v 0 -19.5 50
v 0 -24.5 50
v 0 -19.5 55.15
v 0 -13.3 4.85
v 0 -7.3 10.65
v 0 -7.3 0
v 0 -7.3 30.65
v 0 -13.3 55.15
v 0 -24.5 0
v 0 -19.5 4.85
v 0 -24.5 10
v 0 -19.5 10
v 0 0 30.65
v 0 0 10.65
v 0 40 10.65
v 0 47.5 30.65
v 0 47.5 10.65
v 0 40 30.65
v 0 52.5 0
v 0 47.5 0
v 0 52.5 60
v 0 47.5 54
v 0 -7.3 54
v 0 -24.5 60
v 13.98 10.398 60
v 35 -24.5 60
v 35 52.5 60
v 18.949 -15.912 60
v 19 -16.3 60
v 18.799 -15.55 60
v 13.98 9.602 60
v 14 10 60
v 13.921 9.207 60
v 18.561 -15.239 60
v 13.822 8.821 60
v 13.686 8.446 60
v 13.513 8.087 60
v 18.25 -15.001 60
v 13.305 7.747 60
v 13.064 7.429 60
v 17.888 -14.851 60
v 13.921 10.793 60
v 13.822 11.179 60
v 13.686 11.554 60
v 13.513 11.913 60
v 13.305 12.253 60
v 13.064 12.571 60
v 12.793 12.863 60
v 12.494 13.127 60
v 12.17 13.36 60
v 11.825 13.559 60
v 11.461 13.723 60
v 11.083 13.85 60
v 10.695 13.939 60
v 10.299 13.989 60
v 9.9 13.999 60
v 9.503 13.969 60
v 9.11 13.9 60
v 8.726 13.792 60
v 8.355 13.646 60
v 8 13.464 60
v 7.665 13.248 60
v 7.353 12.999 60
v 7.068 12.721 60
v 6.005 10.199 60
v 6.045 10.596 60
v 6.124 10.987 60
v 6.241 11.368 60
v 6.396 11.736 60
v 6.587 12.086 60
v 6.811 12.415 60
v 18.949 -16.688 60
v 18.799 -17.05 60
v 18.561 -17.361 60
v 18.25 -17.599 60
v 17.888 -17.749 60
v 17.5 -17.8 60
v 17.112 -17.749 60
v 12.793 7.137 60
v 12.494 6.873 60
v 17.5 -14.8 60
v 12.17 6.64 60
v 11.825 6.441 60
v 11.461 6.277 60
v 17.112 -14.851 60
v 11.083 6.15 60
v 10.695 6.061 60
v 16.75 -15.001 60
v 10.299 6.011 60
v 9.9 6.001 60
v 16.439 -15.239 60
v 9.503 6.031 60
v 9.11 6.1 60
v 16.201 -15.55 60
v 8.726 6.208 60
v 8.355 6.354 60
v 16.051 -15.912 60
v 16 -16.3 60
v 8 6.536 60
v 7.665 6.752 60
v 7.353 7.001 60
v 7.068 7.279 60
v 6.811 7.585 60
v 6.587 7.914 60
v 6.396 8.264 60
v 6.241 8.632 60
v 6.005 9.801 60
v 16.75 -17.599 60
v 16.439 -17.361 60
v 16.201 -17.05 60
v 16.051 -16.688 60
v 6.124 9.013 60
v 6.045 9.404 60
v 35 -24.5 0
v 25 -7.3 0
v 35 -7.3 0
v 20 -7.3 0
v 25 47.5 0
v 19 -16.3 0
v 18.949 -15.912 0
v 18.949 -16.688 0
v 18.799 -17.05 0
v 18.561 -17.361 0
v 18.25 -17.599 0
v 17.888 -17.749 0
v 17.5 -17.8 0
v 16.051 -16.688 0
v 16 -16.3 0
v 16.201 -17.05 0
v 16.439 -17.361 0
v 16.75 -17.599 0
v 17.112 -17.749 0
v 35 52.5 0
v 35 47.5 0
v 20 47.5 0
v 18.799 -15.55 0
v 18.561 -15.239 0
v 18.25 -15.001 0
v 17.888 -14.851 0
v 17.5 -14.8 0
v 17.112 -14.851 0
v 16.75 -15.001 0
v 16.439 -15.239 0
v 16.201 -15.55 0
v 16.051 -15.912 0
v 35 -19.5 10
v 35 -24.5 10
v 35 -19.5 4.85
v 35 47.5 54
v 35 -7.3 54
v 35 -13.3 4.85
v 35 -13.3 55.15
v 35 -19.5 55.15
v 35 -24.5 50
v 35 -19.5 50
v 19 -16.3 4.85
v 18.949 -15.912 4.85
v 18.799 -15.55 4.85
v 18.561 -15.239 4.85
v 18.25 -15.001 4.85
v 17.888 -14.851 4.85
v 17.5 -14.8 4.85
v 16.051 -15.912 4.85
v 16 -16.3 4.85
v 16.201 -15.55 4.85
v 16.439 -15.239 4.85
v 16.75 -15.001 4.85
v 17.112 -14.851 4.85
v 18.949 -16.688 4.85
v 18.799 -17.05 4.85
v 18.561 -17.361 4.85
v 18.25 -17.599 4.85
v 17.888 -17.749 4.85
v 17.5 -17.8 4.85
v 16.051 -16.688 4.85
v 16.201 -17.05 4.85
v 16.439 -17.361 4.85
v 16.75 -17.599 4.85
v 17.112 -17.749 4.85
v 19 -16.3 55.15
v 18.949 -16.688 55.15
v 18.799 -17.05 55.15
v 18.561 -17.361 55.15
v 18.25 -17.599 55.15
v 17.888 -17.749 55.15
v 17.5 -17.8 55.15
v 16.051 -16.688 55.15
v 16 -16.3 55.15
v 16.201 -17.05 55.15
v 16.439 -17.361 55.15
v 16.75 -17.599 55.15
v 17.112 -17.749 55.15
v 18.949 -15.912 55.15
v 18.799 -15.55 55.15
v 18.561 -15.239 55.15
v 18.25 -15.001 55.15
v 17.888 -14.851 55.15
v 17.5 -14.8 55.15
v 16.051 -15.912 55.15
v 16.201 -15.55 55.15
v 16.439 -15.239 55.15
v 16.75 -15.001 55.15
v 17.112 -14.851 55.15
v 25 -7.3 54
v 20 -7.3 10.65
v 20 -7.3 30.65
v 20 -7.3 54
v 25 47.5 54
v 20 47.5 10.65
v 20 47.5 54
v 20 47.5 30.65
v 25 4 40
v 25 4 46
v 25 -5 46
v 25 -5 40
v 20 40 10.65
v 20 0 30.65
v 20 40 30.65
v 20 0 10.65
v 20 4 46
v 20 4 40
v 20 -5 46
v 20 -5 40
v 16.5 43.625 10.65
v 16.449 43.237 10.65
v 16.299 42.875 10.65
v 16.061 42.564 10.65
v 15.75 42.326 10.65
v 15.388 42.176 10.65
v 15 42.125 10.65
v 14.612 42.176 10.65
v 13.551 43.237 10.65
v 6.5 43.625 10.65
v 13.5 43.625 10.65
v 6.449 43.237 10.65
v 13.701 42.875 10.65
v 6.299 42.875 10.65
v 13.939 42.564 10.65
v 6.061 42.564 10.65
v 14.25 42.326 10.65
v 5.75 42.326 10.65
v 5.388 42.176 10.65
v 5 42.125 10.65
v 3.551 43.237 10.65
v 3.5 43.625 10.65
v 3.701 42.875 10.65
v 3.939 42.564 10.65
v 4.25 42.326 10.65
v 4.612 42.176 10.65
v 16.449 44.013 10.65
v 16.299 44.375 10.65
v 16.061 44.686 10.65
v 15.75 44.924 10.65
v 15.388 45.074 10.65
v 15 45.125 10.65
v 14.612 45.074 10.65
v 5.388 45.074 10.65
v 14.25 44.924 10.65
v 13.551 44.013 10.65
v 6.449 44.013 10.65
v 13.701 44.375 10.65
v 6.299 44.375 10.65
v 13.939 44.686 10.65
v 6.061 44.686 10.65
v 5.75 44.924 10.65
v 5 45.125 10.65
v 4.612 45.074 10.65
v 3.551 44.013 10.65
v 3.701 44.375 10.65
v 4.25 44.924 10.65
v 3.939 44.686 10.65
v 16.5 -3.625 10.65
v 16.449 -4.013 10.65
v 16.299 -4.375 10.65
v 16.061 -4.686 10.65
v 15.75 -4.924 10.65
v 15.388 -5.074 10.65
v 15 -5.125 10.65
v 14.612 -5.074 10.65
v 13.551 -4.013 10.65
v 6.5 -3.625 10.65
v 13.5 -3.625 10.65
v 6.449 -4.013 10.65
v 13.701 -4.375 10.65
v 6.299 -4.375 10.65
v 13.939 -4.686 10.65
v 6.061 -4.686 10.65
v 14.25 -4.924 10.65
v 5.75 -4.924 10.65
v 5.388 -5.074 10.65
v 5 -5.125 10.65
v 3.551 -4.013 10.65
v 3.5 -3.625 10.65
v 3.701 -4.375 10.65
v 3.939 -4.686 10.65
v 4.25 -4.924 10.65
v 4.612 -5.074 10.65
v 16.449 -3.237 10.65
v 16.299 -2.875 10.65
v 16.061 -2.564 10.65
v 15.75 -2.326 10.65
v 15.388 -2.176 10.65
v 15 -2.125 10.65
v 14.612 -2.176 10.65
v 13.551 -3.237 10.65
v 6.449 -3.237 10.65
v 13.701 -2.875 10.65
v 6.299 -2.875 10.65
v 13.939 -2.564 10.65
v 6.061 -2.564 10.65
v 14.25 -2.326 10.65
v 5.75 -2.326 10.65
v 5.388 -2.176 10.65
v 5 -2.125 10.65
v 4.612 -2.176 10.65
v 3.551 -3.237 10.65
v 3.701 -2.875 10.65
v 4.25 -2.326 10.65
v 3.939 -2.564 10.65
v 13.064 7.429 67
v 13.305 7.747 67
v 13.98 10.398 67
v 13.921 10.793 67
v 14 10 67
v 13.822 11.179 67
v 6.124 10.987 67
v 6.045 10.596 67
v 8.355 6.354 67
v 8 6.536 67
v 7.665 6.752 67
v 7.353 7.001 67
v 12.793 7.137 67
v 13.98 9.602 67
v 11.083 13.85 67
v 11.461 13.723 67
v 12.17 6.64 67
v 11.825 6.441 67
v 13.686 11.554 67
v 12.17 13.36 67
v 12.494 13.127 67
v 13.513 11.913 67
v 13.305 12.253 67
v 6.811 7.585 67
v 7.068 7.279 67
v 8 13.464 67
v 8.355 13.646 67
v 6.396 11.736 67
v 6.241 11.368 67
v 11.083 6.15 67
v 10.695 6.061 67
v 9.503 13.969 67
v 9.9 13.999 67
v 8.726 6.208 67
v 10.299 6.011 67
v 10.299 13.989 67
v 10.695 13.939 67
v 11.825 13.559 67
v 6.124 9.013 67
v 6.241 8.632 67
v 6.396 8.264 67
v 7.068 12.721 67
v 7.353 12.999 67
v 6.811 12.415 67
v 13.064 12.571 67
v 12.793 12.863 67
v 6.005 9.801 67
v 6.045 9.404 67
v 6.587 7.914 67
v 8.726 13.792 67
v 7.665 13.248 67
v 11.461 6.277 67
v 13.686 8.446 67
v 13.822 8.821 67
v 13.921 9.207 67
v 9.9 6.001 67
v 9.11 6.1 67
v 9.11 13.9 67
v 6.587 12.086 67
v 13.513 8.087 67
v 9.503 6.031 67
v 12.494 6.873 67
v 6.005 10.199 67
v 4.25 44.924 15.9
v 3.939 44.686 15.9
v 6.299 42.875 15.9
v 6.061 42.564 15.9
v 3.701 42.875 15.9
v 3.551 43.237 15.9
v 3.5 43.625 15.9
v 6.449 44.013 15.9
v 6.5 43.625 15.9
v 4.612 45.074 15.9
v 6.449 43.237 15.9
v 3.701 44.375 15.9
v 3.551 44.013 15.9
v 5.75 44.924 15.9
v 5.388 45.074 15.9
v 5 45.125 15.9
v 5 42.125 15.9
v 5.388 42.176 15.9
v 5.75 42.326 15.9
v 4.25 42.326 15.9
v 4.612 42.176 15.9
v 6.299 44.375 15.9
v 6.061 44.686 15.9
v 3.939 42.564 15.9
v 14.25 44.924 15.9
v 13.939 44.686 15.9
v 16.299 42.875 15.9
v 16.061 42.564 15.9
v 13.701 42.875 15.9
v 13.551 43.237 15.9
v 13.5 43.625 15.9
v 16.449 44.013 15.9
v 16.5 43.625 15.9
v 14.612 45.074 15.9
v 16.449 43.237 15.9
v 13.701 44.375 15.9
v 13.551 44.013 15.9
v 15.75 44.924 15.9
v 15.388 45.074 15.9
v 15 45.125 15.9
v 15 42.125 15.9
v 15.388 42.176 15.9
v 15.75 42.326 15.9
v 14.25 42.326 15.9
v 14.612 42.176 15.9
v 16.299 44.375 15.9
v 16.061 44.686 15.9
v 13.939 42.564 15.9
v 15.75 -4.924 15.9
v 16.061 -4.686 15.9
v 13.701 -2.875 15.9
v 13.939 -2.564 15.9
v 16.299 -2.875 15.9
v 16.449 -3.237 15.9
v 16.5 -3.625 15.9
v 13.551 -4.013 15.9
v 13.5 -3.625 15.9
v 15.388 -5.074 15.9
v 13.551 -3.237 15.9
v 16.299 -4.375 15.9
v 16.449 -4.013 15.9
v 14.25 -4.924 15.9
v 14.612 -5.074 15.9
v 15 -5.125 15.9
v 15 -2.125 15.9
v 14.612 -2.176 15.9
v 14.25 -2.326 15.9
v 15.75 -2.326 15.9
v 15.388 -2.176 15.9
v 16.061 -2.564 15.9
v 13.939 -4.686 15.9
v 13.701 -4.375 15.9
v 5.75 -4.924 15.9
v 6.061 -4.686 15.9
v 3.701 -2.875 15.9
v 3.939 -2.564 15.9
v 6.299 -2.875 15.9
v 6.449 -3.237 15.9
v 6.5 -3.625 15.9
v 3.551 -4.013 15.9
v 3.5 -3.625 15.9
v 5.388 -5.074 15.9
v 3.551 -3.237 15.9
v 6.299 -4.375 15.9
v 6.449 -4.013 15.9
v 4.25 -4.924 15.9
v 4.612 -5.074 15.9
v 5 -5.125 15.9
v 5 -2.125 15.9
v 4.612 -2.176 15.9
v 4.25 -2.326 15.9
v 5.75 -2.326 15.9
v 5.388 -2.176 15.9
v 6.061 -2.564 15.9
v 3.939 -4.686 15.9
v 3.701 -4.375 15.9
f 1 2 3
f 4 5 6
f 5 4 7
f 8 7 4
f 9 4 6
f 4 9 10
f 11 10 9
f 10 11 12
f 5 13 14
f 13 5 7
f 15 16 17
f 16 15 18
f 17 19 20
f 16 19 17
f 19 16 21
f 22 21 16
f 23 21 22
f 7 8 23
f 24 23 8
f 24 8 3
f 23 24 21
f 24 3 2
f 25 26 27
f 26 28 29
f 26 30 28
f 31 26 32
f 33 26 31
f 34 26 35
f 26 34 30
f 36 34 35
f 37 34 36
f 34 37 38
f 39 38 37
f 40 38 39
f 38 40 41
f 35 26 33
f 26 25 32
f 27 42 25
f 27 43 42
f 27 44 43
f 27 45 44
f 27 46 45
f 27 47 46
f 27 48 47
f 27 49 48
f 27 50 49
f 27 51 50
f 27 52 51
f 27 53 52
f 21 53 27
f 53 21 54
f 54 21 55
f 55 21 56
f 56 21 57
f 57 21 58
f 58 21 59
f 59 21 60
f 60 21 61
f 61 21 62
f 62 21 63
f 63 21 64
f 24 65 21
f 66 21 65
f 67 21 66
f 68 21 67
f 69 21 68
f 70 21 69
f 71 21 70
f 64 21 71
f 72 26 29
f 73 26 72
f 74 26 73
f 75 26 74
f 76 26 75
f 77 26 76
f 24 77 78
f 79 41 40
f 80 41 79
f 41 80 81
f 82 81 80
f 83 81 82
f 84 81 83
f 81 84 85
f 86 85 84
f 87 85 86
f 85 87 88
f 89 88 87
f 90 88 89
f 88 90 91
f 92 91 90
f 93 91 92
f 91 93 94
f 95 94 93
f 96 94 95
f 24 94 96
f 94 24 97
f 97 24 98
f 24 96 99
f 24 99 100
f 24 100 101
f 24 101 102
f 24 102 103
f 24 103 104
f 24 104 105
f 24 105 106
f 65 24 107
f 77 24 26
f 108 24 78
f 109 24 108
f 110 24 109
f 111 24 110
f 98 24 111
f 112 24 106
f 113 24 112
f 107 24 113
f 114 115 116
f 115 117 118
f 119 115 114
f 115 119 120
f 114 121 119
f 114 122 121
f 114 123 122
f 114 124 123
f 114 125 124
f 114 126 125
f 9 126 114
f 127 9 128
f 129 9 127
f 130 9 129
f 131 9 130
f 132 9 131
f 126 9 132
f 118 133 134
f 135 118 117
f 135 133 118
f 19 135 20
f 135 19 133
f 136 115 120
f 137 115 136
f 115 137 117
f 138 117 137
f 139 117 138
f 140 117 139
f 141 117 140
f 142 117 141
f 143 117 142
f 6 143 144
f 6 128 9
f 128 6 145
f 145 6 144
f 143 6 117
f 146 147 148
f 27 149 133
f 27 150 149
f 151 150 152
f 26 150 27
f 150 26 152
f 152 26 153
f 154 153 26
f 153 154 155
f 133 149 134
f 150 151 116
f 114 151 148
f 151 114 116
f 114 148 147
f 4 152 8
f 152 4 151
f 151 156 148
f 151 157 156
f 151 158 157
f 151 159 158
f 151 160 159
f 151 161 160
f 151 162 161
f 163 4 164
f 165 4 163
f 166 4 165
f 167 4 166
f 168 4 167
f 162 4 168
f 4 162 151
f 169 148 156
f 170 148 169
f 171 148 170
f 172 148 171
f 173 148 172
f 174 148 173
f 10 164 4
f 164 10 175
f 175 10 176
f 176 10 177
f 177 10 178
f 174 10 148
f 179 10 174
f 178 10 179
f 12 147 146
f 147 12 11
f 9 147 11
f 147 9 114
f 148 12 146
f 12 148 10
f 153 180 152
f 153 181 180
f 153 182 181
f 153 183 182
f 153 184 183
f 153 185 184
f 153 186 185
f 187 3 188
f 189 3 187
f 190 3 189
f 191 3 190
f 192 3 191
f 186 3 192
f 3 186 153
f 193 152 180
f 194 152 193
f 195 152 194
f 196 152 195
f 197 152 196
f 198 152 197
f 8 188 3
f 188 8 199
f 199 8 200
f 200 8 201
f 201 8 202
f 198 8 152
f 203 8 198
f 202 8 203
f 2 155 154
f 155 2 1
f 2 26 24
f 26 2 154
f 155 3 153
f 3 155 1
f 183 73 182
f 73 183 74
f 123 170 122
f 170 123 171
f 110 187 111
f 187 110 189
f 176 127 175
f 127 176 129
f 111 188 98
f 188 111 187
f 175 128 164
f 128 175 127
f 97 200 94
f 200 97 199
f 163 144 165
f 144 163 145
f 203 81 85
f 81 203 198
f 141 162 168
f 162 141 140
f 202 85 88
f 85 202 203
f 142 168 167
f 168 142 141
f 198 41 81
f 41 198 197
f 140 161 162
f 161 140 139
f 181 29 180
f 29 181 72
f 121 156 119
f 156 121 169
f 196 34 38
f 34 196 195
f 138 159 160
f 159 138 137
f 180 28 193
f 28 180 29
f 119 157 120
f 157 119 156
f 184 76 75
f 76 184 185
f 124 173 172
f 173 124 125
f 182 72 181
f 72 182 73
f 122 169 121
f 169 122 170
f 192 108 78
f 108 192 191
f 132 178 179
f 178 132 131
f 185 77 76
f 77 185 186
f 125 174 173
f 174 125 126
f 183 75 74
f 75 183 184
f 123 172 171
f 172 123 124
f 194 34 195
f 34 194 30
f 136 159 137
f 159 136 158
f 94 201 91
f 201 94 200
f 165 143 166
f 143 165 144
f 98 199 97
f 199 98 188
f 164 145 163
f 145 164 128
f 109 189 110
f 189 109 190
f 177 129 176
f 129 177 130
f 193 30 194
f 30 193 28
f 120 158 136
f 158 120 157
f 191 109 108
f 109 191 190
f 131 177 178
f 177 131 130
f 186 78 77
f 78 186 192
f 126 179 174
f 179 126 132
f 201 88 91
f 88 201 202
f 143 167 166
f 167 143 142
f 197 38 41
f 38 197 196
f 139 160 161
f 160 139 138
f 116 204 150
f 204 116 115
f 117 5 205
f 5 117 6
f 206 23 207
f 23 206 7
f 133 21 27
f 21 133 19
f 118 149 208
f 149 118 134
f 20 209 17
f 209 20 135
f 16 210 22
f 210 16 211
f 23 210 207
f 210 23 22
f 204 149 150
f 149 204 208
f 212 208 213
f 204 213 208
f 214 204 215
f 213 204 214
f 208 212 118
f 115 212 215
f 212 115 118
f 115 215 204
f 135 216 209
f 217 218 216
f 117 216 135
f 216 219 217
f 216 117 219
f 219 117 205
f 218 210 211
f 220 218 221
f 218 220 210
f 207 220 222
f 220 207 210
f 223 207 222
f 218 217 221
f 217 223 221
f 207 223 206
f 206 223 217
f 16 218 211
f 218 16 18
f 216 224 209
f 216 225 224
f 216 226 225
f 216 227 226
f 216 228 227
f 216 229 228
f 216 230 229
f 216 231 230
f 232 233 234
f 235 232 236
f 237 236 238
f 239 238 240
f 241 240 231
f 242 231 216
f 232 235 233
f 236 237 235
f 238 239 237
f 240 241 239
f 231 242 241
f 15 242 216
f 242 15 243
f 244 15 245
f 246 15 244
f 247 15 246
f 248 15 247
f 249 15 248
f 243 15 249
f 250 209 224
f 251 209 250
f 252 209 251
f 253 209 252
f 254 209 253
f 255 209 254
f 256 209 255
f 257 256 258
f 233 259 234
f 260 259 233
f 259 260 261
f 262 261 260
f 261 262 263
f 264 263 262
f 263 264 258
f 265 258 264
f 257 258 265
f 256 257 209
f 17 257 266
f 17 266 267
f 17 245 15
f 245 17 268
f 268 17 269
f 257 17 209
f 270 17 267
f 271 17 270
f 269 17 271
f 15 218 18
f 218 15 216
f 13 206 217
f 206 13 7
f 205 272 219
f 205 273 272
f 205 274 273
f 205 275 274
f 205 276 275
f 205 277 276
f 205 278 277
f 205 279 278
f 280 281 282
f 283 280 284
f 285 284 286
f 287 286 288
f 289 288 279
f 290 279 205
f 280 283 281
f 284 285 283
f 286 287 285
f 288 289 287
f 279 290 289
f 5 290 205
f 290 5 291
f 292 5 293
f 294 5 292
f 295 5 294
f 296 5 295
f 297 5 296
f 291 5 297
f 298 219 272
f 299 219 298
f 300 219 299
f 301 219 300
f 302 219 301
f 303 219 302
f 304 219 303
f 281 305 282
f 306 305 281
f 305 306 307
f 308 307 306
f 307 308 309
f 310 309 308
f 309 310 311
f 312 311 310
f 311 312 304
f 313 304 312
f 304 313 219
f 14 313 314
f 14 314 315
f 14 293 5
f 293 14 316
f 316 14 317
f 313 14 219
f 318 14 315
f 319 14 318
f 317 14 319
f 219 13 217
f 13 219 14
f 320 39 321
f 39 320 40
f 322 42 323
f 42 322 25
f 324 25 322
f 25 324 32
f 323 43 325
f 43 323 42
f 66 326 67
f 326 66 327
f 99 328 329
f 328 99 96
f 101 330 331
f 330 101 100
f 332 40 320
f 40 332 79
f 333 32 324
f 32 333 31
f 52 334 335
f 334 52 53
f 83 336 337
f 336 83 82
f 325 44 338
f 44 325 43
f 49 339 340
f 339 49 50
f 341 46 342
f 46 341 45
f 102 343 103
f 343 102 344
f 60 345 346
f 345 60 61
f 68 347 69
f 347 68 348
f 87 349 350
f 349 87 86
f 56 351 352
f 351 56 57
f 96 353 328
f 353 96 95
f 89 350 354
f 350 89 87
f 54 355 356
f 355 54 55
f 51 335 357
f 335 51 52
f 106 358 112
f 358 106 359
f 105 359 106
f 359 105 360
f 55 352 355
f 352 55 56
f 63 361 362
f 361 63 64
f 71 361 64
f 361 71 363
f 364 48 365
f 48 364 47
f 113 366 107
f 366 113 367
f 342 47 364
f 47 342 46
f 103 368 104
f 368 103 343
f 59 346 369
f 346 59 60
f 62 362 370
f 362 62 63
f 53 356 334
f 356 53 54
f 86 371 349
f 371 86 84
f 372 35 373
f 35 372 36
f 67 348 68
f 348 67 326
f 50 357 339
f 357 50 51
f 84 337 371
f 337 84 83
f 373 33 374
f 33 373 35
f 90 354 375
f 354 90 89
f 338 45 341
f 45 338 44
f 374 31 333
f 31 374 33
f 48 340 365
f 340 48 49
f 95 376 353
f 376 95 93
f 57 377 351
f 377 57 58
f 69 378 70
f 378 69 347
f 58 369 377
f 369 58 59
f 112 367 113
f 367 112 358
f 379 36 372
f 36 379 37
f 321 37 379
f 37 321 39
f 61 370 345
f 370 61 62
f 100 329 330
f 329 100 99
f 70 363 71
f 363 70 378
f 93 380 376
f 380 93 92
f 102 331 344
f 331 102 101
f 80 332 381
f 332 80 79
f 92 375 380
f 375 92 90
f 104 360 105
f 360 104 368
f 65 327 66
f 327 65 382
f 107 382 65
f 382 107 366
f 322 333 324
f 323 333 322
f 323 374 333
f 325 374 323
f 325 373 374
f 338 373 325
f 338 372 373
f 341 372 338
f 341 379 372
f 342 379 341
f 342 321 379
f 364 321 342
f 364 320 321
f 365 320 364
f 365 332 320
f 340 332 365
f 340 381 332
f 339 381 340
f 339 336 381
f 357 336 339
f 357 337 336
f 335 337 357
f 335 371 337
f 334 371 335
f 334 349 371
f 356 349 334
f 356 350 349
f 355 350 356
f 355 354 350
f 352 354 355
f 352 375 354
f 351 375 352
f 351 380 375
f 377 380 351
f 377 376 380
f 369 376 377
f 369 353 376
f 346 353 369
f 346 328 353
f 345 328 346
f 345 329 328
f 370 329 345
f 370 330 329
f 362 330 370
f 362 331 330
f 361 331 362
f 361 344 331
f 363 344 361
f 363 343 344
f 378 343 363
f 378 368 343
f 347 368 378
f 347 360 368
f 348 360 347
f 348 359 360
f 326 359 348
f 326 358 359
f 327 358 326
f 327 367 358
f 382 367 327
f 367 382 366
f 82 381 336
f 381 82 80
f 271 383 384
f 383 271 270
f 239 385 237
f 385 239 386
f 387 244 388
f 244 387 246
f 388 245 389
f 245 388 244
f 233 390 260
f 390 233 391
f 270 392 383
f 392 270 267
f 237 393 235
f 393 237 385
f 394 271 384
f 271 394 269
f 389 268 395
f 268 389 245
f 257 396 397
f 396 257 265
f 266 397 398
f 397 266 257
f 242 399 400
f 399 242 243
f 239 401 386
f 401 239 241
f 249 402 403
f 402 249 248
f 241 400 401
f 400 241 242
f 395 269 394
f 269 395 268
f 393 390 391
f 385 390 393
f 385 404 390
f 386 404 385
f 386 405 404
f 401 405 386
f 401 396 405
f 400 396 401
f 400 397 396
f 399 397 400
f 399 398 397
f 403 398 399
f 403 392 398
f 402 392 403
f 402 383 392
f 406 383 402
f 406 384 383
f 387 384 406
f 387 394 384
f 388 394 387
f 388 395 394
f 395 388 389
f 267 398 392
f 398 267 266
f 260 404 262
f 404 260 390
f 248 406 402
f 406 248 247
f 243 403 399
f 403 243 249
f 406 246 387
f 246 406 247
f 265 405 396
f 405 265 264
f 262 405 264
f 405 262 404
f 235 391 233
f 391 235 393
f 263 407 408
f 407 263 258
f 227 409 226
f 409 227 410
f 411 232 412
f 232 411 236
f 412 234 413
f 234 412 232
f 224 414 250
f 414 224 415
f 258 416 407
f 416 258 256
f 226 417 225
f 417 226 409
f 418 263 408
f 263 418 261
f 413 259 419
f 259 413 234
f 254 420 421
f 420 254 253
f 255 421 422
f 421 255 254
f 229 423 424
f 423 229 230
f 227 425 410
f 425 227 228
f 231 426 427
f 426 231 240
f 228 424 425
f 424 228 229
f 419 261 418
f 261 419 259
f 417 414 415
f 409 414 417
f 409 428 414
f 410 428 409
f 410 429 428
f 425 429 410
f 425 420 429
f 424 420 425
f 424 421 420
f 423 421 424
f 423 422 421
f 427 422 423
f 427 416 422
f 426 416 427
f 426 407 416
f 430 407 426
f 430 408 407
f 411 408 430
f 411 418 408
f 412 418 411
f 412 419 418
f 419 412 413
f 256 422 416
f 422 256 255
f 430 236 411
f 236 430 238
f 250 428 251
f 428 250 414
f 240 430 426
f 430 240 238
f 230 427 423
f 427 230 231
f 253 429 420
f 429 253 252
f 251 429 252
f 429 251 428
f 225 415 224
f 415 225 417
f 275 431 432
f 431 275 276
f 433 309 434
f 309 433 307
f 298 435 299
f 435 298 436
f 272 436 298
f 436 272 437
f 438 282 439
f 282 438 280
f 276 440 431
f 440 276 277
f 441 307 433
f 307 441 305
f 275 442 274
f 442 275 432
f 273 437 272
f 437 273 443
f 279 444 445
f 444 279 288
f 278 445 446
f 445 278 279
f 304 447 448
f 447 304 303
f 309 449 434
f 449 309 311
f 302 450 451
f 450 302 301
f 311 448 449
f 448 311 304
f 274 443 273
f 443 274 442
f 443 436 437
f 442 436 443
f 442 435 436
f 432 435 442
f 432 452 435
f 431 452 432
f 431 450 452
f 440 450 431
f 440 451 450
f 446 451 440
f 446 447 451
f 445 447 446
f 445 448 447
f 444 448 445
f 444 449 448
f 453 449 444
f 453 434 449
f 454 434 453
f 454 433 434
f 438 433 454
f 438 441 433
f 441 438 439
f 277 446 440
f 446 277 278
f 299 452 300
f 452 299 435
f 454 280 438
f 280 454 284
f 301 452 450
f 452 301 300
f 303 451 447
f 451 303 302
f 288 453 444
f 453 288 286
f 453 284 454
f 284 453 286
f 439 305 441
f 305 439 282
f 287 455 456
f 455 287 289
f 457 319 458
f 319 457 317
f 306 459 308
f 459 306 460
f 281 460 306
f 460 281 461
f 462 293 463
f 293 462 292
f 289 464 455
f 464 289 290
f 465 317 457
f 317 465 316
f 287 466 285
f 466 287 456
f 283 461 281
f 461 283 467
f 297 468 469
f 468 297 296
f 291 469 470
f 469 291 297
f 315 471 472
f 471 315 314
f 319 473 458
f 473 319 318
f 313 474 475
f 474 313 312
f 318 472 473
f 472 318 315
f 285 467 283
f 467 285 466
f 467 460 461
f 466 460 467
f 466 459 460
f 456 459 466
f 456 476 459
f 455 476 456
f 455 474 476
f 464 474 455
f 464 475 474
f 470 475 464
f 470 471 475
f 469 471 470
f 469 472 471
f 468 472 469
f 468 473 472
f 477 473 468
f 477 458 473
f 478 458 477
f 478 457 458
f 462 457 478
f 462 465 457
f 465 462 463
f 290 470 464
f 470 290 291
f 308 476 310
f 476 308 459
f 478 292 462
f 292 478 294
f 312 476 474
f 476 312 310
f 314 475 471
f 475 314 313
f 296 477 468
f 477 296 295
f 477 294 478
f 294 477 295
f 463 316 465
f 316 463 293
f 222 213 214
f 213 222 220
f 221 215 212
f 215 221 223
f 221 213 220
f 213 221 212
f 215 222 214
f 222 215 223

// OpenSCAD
$fa = 1;
$fs = 0.4;
/////////////////////////SERVO MODEL////////////////////////////
module servo(){
    color([0,0,1])
    difference (){
    union(){    
    rotate([90,0,90])//Servo Corpus
        cube([40, 39.5, 20]); 
        
    translate([0,40,8])//Screwholders
        cube([20,7.25,2.6]); 
    translate([0,-7.25,8])
        cube([20,7.25,2.6]);
    
    translate([10,10,-2]) //Drive shaft
        cylinder(h=3, r=6.5);
    translate([10,10,-5.5])
        cylinder(h=4, r=5.8/2);
        
    translate([10-3.5,-4.7,33])
        cube([7,8,5]);
        
    }
    ///////////Cutting///////////
    
    union(){ //Cut out Screwholes
    screwholes_servo();
    translate([20,40,0])
    rotate([0,0,180])
    screwholes_servo();
    }
}
  
}

module screwholes_servo(){
     translate([0, 0, 7.9]) {
        translate([5, -7.25/2, 0]){
            cylinder(h=3, r=4.4/2);
            translate([-1.8,-4.8,0])
            cube([3.6, 4, 3]); 
        }
           translate([15, -7.25/2, 0]){
            cylinder(h=3, r=4.4/2);
            translate([-1.8,-4.8,0])
            cube([3.6, 4, 3]); 
        }
      
    }
}

module drive_shaft_attachment(){
    translate([-19,-19,0]){
        difference(){
            union(){
            
             translate([0,14.5,0])
                cube([38, 9, 2.77]); 
             translate([14.5,0,0])
                cube([9, 38, 2.77]); 
            translate([19,19,0])
                cylinder(h=5.4, r=4.4);   
                }
             union(){   
             translate([19,19,-00.1])//Driftshaft Clutch
                cylinder(h=6, r=5.8/2);
             translate([6,19,-00.1]) //Screwhole
                 cylinder(h=30, r=3/2);
              translate([32,19,-00.1])//Screwhole
                 cylinder(h=30, r=3/2);
              translate([19,32,-00.1])//Screwhole
                 cylinder(h=30, r=3/2);
              translate([19,6,-00.1])//Screwhole
                 cylinder(h=30, r=3/2);
             }
        }
    }
    
}

////////////////////////////////Servo Moveable Mallet//////////////////////////////
module mounting_plate(){
     color([0,1,0])
    difference(){
        union(){
                
          
               
            translate([0,-13.3,0]) //Sidewalls
                cube([35,6,60]);
             translate([0,40+7.5,0])
                cube([35,5,60]);
            
             translate([0,-10,54])//Topplate
                cube([35,60,6]);
            
            translate([20,-10,0])//inner structure
                cube([5,60,60]);
            
            translate([0,40,10.65])//counterpart screws
                cube([23,12,20]);
            translate([0,-12,10.65])
                cube([23,12,20]);
            
            translate([10,10,59]) //Axle Top
                cylinder(h=8, r=4);
                
            translate([35,-8.3,0]) // Claw for Mounting Plate
            rotate([0,0,180])
            claw();
        }
       union(){ ///////////Cutting///////////
          translate([15, -7.25/2, 9.9]) // Screwholes Mouting Plate
                cylinder(h=6, r=3/2);
          translate([5, -7.25/2, 9.9])
                cylinder(h=6, r=3/2);
           translate([20,40,0]){
               rotate([0,0,180]){
                    translate([15, -7.25/2, 9.9])
                        cylinder(h=6, r=3/2);
                    translate([5, -7.25/2, 9.9])
                        cylinder(h=6, r=3/2);
               }
           }
        translate([19,-5,40])//Cable channel
                cube([7,9,6]);
           
//        translate([0, -9.3, 0]){ // Screwholes for Mounting Plate
//            rotate([90,0,0]){
//                translate([30,5,0])
//                cylinder(h=5, r=3/2);
//                translate([5,5, 0])
//                cylinder(h=5, r=3/2);
//                translate([30,55, 0])
//                cylinder(h=5, r=3/2);
//                translate([5,55, 0])
//                cylinder(h=5, r=3/2);
//                translate([30,30, 0])
//                cylinder(h=5, r=3/2);
//                translate([5,30, 0])
//                cylinder(h=5, r=3/2);
//              
//            }
//        }
        
    
           
       }
    }
}


////////////////////////////////Housing # Main Structure//////////////////////////////
module housing(){
    difference(){
        union(){
            
            
            translate([-10,0,-6])//Bottomplate
                cube([80,60,6]);
            translate([35,0,-1]) //Frontplate Fix Mallet
                cube([35,6,68.4+1]);
       
            translate([70-6,20,-1]) //Sideplate Fix Mallet
                cube([6,30,68.4+1]);
            translate([70,5,8])
            rotate([0,0,180])
            claw();
        }
        union(){
    
//         translate([35, +4, 8]){ // Screwholes for Mounting Plate
//            rotate([90,0,0]){
//                translate([30,5,0])
//                cylinder(h=6, r=3/2);
//                translate([5,5, 0])
//                cylinder(h=6, r=3/2);
//                translate([30,55, 0])
//                cylinder(h=6, r=3/2);
//                translate([5,55, 0])
//                cylinder(h=6, r=3/2);
//                translate([30,30, 0])
//                cylinder(h=6, r=3/2);
//                translate([5,30, 0])
//                cylinder(h=6, r=3/2);
//              
//            }
//        }
      
         translate([-9,4.3,0]){
            
        translate([6,19,-4]) //Screwhole
                 cylinder(h=30, r=3/2);
        translate([32,19,-4])//Screwhole
                 cylinder(h=30, r=3/2);
        translate([19,32,-4])//Screwhole
                 cylinder(h=30, r=3/2);
        translate([19,6,-4])//Screwhole
                 cylinder(h=30, r=3/2);
    }
     translate([-10,0,0-6.1]){ //Screwholes Sideplate Servo
             translate([3,35,0])
                cylinder(h=13, r=3/2);
             translate([3,55,0])
               cylinder(h=13, r=3/2);}

}
         
    
}
     
 

}
module top_plate_housing(){
    difference(){
        union(){
      translate([-10,0,68.4])//Topplate
                cube([80,60,6]);
      translate([-10,30,0]) //Sideplate Servo
                cube([6,30,68.4+1]);
            
        }
        union(){
            translate([10,10+13.3,68.4+3.49]){ // Bearing hole
                    cylinder(h=7, r=8, center=true);
                     translate([0, 0, -3.5])
                    cylinder(h=2, r=9, center=true);
         }
            
        
          translate([-10,0,68.4-6]){ //Screwholes Frontplate Fix Mallet
             translate([80-10,3,0])
                cylinder(h=13, r=3/2);
             translate([80-25,3,0])
               cylinder(h=13, r=3/2);
        }
         translate([-10,0,68.4-6]){ //Screwholes Sideplate Fix Mallet
             translate([77,25,0])
                cylinder(h=13, r=3/2);
             translate([77,45,0])
               cylinder(h=13, r=3/2);
             
        }
          translate([-10,0,0-6]){ //Screwholes Sideplate Servo
             translate([3,35,0])
                cylinder(h=13, r=3/2);
             translate([3,55,0])
               cylinder(h=13, r=3/2);
             
        }
    }
    
    
}
}

module claw(){
   difference(){
   union(){
  cube([35,5,60]);
    
  translate ([0,5-1,0]) // Bridge Bottom
  cube([35,10+1,5-0.15]);
  translate ([0,11.2,0]) // Claw Bottom
  cube([35,5,10]);
    
  translate ([0,5-1,55+0.15])  // Bridge Top
  cube([35,10+1,5-0.15]);
  translate ([0,11.2,50])// Claw Top
  cube([35,5,10]);
   }
   translate([35/2,8,-0.1])
    cylinder(h=70, r=3/2);
   
}
}

//Complete:
//claw();
//mounting_plate();

//housing();
//top_plate_housing();
    
//translate([0,13.3,8]){
mounting_plate();

//servo();
// translate([10,10,-8])
 //   drive_shaft_attachment();
//}
